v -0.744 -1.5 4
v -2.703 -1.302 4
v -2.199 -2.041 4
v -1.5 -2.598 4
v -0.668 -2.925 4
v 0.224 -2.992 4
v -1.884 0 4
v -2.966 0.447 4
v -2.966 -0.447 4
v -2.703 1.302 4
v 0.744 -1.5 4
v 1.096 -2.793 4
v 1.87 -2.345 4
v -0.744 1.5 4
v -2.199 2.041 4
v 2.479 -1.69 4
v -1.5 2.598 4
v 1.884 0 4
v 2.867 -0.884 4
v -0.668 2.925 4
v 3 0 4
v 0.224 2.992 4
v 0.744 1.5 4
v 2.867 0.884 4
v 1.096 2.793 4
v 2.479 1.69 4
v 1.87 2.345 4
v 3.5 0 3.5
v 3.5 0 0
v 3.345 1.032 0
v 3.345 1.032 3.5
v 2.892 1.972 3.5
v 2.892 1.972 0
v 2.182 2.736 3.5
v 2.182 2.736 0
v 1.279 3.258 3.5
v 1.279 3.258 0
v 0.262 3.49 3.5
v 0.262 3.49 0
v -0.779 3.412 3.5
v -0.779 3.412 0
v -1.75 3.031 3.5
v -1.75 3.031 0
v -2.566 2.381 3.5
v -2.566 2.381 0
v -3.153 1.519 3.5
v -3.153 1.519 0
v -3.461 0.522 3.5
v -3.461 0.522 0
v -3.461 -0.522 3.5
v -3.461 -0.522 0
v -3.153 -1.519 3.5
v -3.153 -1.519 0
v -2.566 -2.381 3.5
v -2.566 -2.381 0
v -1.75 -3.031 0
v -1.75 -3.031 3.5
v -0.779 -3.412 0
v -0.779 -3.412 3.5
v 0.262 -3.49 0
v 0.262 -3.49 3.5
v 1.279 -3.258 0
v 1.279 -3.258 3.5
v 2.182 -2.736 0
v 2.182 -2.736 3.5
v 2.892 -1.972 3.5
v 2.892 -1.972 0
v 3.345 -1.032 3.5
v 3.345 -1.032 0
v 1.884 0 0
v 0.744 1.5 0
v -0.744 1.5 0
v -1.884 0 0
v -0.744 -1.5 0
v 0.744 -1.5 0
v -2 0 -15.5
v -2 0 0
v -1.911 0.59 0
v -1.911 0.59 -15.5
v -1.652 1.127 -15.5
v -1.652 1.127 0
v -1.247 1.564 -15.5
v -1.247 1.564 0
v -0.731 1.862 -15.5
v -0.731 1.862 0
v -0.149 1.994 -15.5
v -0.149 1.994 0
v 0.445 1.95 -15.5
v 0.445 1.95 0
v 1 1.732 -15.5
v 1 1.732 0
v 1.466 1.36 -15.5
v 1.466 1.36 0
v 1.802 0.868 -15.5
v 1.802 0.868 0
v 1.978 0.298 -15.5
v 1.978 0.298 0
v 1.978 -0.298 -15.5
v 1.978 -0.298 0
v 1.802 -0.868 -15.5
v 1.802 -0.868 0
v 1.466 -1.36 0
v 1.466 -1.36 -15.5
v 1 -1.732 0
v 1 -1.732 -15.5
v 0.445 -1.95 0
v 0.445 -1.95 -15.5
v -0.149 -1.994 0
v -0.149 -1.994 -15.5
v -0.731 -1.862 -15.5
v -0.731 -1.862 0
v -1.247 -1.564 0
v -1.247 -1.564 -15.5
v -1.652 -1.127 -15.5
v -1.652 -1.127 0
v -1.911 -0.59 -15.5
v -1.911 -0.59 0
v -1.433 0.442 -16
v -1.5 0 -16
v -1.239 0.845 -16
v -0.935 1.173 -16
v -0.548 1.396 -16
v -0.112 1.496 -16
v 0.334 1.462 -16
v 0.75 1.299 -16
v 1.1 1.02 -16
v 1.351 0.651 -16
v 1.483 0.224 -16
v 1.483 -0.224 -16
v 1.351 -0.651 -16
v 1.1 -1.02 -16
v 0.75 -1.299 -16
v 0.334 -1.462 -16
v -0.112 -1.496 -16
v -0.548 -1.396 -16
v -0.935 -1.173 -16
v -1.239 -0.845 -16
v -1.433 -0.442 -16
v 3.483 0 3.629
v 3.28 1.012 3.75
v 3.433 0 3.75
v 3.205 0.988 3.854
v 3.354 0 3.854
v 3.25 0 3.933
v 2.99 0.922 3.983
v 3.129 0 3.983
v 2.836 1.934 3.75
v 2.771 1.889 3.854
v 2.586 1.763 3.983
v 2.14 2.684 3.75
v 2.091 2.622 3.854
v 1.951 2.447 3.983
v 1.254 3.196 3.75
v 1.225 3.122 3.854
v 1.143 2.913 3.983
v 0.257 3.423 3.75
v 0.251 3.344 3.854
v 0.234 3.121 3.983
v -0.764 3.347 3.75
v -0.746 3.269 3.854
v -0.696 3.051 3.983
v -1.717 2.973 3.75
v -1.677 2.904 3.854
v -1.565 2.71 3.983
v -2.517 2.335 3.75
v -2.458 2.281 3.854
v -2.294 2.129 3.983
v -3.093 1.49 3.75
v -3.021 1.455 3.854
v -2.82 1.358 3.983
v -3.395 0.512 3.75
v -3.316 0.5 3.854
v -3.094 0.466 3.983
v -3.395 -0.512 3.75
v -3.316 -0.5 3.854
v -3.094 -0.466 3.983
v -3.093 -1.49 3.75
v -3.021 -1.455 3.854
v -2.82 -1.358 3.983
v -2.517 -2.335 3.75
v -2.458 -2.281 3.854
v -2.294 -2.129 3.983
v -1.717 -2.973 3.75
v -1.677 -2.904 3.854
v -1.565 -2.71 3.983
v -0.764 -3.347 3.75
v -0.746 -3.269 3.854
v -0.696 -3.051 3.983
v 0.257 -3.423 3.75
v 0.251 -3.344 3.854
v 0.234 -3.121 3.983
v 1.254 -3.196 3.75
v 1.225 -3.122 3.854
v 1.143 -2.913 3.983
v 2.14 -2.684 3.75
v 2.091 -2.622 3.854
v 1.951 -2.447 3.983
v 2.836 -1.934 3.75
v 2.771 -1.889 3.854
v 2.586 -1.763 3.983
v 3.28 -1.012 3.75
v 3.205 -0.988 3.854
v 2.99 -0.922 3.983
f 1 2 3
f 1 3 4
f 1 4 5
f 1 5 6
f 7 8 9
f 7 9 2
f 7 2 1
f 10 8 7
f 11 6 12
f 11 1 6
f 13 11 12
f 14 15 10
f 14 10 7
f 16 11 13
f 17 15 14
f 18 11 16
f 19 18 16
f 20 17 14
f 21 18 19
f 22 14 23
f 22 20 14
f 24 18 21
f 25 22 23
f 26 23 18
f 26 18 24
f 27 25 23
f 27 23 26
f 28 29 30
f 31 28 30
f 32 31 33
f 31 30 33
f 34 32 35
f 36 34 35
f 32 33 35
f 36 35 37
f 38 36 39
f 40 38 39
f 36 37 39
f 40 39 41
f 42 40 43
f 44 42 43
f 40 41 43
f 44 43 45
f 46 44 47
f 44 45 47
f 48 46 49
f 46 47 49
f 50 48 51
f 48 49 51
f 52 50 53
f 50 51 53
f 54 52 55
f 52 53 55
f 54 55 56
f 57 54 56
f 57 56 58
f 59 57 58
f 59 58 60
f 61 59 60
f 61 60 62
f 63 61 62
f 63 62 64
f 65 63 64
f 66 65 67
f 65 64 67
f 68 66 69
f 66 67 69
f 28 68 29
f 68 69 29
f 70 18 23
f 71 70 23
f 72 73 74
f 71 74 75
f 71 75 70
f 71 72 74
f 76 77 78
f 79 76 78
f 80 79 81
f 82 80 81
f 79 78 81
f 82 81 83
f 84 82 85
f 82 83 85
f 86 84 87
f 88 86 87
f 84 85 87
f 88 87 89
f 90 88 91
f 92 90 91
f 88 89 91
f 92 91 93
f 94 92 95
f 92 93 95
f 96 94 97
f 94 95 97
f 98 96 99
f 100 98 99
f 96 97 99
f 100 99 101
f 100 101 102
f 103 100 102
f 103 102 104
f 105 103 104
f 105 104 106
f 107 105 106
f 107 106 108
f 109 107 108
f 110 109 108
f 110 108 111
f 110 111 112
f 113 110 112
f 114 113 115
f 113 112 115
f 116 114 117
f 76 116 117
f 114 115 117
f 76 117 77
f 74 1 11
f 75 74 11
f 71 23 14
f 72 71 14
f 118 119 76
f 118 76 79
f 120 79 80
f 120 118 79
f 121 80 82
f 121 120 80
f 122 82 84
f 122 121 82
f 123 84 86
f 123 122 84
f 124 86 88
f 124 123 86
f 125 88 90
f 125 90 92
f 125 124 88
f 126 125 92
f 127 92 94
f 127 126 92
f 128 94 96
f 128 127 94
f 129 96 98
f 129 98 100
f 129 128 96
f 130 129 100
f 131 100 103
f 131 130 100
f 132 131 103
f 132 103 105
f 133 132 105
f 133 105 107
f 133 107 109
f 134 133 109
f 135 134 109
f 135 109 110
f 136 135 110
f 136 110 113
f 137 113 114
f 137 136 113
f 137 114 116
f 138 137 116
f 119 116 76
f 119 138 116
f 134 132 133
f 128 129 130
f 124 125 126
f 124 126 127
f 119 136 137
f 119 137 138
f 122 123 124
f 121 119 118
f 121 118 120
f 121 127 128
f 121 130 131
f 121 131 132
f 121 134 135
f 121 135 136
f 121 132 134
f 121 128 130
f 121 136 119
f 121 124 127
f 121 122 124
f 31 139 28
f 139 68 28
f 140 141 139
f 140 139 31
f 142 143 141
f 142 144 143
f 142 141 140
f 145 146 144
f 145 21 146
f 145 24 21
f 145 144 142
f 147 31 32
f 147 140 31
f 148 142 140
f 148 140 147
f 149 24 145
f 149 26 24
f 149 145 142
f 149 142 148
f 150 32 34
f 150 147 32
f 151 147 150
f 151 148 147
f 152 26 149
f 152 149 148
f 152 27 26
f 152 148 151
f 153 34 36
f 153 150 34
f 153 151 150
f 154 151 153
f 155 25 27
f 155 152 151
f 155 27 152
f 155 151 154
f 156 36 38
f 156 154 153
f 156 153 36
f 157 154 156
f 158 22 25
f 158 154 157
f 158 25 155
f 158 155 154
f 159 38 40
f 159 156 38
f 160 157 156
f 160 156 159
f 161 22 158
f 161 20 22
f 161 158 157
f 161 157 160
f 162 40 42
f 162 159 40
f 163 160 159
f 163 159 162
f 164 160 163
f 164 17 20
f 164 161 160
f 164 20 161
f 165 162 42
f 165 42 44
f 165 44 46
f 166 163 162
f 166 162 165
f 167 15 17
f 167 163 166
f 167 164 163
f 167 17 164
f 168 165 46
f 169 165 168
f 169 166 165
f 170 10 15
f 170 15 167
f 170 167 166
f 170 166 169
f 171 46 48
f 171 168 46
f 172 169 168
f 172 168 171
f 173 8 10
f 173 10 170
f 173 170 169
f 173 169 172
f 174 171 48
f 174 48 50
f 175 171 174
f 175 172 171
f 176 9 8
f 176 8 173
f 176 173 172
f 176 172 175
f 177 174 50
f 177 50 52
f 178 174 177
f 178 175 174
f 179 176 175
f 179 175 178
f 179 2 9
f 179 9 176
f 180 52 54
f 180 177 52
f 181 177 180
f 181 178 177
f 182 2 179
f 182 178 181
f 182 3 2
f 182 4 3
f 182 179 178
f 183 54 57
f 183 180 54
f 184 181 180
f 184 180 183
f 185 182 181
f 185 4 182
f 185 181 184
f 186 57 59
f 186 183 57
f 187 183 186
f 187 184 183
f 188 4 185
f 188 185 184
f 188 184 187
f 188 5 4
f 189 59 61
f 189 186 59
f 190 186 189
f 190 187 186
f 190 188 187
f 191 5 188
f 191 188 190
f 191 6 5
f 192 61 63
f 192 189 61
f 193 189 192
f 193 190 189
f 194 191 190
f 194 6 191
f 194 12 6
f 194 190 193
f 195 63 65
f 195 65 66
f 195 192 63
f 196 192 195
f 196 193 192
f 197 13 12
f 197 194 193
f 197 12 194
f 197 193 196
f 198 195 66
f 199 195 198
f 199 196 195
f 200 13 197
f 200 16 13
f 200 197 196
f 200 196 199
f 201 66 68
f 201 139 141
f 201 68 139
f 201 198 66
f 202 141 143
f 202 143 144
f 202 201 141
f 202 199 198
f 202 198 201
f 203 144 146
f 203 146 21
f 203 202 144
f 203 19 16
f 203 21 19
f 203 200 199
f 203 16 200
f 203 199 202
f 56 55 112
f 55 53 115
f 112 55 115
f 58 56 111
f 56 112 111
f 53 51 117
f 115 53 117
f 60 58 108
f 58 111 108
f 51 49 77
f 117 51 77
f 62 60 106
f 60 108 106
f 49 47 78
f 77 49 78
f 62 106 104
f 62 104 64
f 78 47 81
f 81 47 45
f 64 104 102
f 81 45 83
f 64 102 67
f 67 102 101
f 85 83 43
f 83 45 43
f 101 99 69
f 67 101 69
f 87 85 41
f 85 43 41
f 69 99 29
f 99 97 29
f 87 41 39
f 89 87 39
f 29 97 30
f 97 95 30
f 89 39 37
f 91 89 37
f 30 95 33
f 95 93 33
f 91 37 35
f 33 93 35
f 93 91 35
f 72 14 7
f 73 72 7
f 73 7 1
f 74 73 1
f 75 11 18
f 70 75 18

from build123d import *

# Parameters (mm, degrees)
ESQUISSE1_R             = 3.5
BASE_EXTRUSION_DEPTH    = 4
ESQUISSE2_R             = 2
BOSS_EXTRU_1_DEPTH      = 16
ENL_V_MAT_EXTRU_1_DEPTH = 4
CONG_1_R                = 0.5
CHANFREIN1_SIZE         = 0.5


with BuildPart() as part:
    # Esquisse1 → Base-Extrusion (new body)
    with BuildSketch(Plane.XY):
        Circle(ESQUISSE1_R)
    extrude(amount=BASE_EXTRUSION_DEPTH)

    # Esquisse2 → Boss.-Extru.1 (add)
    with BuildSketch(Plane(origin=(0, 0, 0), x_dir=(-1, 0, 0), z_dir=(0, 0, -1))):
        Circle(ESQUISSE2_R)
    extrude(amount=BOSS_EXTRU_1_DEPTH)

    # Esquisse3 → Enlèv. mat.-Extru.1 (cut)
    with BuildSketch(Plane.XY.offset(4)):
        Polygon((1.884038216, 0), (0.744038216, 1.5), (-0.744038216, 1.5), (-1.884038216, 0), (-0.744038216, -1.5), (0.744038216, -1.5), align=None)
    extrude(amount=-ENL_V_MAT_EXTRU_1_DEPTH, mode=Mode.SUBTRACT)

    # Congé1
    cong_1_edges = [part.edges().sort_by_distance(p)[0] for p in [
        (-3.5, 0, 4),
    ]]
    fillet(cong_1_edges, radius=CONG_1_R)

    # Chanfrein1
    chanfrein1_edges = [part.edges().sort_by_distance(p)[0] for p in [
        (2, 0, -16),
    ]]
    chamfer(chanfrein1_edges, length=CHANFREIN1_SIZE)


solid = part.part
